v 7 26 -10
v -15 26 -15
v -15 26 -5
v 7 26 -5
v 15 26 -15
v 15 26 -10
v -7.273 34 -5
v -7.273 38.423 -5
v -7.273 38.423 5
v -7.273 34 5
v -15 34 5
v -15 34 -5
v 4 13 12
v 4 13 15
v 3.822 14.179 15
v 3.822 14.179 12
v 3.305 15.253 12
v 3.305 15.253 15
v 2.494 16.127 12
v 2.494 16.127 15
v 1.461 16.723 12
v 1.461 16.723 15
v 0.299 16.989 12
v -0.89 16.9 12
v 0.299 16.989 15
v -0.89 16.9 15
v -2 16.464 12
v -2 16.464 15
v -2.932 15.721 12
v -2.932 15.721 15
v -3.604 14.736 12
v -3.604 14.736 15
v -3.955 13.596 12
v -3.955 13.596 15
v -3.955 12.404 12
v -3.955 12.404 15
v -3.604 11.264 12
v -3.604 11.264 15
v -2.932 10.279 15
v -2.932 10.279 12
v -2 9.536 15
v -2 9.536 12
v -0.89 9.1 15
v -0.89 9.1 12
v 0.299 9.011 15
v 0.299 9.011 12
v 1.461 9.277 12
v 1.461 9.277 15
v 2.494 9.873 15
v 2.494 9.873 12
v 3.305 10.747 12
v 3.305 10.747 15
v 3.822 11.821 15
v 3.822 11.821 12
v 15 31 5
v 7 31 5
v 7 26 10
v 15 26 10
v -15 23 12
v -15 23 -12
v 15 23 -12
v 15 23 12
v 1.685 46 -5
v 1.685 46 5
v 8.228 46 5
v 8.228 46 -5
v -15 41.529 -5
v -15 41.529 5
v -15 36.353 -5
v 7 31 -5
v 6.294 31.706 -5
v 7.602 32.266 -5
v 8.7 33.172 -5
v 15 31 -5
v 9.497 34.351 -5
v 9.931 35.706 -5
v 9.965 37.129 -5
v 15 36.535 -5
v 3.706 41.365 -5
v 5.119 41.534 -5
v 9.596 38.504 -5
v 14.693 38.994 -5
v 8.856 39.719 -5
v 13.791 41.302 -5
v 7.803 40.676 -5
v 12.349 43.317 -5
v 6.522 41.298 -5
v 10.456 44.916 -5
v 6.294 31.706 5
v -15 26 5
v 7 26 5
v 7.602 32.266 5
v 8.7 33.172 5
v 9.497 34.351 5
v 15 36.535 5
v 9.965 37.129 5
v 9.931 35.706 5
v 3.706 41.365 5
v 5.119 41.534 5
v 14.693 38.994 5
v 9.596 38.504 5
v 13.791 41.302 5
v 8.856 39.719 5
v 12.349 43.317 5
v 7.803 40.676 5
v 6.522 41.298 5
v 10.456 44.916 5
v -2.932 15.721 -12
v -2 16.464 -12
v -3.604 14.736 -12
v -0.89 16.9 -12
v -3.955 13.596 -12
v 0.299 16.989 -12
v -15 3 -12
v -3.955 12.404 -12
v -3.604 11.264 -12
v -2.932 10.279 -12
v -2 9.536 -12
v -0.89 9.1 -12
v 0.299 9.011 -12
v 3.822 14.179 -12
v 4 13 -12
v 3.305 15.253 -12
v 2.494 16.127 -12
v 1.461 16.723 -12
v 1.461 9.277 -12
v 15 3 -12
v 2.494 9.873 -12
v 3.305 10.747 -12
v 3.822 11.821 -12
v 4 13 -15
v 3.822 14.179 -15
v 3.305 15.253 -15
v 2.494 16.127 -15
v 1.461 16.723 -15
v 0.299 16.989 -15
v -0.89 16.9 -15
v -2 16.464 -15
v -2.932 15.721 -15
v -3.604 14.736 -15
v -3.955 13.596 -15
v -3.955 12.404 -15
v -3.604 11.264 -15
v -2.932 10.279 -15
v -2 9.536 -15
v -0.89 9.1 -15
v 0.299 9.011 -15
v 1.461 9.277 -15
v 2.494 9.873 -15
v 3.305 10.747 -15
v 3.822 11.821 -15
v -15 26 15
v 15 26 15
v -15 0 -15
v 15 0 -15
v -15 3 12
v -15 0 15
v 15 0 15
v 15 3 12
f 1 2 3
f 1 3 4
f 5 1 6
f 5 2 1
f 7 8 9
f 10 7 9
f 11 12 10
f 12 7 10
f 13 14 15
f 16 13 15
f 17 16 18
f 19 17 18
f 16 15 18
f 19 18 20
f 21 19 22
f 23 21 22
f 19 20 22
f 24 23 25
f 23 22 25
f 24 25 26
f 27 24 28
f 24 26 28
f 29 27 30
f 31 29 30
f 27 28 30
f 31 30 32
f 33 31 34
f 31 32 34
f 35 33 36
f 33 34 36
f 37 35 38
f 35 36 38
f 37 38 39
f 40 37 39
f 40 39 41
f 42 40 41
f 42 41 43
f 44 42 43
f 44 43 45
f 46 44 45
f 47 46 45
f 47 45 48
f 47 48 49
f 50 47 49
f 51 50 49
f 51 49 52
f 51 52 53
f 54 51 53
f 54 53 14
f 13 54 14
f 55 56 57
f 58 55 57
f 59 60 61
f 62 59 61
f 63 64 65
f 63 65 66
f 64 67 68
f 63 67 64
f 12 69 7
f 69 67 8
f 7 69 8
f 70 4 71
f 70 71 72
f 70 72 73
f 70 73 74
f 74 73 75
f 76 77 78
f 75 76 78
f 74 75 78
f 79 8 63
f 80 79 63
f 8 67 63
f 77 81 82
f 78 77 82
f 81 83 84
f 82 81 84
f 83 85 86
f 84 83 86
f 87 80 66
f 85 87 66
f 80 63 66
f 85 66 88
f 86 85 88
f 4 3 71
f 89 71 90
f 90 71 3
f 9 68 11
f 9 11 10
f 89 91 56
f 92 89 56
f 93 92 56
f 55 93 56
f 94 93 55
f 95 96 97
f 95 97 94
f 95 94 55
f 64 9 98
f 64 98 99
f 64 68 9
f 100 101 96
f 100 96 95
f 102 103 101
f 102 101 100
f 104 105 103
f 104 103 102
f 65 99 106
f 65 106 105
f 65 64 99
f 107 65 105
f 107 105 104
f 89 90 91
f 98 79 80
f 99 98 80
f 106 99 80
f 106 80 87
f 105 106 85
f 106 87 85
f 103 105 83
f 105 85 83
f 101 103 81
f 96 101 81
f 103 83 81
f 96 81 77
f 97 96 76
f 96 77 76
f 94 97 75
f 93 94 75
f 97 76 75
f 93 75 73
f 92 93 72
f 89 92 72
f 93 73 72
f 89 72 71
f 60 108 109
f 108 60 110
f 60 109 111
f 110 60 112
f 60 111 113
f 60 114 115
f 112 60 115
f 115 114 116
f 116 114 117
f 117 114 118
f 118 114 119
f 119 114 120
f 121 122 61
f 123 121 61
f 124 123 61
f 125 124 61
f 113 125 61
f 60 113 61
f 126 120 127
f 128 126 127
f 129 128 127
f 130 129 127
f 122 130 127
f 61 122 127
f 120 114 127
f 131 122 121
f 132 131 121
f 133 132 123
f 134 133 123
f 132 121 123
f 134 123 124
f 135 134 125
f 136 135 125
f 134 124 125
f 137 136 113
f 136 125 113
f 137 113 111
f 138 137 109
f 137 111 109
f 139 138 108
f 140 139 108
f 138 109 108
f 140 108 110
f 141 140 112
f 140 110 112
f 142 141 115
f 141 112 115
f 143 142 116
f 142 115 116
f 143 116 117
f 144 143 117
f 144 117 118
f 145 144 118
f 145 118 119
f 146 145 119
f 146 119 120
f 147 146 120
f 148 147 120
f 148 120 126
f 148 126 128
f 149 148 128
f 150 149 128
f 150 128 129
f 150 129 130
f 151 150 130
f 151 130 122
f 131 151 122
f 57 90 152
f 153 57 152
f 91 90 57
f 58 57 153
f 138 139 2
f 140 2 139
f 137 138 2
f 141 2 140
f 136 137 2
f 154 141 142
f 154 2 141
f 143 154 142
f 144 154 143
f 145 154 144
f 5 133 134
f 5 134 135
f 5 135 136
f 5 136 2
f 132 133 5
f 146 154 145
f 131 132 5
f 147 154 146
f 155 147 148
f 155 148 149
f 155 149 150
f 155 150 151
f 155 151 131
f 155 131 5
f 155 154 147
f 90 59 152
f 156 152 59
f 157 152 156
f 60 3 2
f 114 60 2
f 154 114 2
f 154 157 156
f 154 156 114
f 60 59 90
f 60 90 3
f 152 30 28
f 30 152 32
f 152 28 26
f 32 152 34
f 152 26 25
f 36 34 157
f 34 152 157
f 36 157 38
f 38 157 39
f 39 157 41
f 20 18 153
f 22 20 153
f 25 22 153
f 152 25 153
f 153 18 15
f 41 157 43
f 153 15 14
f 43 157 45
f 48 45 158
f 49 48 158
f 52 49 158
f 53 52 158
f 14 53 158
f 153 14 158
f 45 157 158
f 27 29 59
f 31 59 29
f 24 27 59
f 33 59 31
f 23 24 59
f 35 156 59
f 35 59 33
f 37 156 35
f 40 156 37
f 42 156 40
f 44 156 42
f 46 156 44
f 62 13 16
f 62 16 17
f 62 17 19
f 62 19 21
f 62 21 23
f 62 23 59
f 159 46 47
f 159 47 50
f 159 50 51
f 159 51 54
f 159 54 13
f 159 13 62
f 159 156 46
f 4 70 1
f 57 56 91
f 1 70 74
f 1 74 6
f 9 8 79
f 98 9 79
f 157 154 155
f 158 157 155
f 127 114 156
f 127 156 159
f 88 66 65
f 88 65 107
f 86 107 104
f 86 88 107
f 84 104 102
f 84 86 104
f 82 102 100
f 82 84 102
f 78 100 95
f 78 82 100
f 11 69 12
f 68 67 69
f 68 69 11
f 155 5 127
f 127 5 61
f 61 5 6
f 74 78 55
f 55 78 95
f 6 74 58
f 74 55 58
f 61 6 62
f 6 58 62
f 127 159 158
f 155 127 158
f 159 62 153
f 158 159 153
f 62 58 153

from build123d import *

# Parameters (mm, degrees)
SKETCH1_W           = 30
SKETCH1_H           = 30
BOSS_EXTRUDE1_DEPTH = 26
SHELL1_T            = -3
SKETCH3_R           = 4
CUT_EXTRUDE1_DEPTH  = 43.438190348
BOSS_EXTRUDE4_START = -15
SKETCH4_W           = 10
SKETCH4_H           = 20
BOSS_EXTRUDE4_DEPTH = 30
CUT_EXTRUDE2_DEPTH  = 10
RIB1_REACH          = 58.93
SKETCH7_WALL_W      = 122.930630432
SKETCH7_WALL_H      = 8
CUT_EXTRUDE3_DEPTH  = 10
CUT_EXTRUDE4_DEPTH  = 10
BOSS_EXTRUDE5_REACH = 51.434
SKETCH11_W          = 8
SKETCH11_H          = 10


with BuildPart() as part:
    # Sketch1 → Boss-Extrude1 (new body)
    with BuildSketch(Plane(origin=(0, 0, 0), x_dir=(1, 0, 0), z_dir=(0, 1, 0))):
        Rectangle(SKETCH1_W, SKETCH1_H)
    extrude(amount=BOSS_EXTRUDE1_DEPTH)

    # Shell1
    shell1_openings = [part.faces().sort_by_distance(p)[0] for p in [
        (-15, 13, 0),
        (15, 13, 0),
    ]]
    offset(amount=SHELL1_T, openings=shell1_openings, kind=Kind.INTERSECTION)

    # Sketch3 → Cut-Extrude1 (cut, through all)
    with BuildSketch(Plane.XY.offset(15)):
        with Locations((0, 13)):
            Circle(SKETCH3_R)
    extrude(amount=-CUT_EXTRUDE1_DEPTH, mode=Mode.SUBTRACT)

    # Sketch4 → Boss-Extrude4 (add)
    with BuildSketch(Plane(origin=(0, 0, 0), x_dir=(0, 0, -1), z_dir=(1, 0, 0)).offset(BOSS_EXTRUDE4_START)):
        with Locations((0, 36)):
            Rectangle(SKETCH4_W, SKETCH4_H)
    extrude(amount=BOSS_EXTRUDE4_DEPTH)

    # Sketch6 → Cut-Extrude2 (cut)
    with BuildSketch(Plane(origin=(0, 0, -5), x_dir=(-1, 0, 0), z_dir=(0, 0, -1))):
        with BuildLine():
            Line((15, 26), (15, 36.352761804))
            Line((15, 36.352761804), (-3.705905484, 41.364994072))
            ThreePointArc((-3.705905484, 41.364994072), (-9.829629226, 37.829459621), (-6.294095226, 31.705735619))
            Line((-6.294095226, 31.705735619), (15, 26))
        make_face()
    extrude(amount=-CUT_EXTRUDE2_DEPTH, mode=Mode.SUBTRACT)

    # Sketch7 wall → Rib1 (add, up to next)
    with BuildSketch(Plane(origin=(15, 28.5, -7.5), x_dir=(0, -0.707106781187, -0.707106781187), z_dir=(0, 0.707106781187, -0.707106781187)), mode=Mode.PRIVATE) as rib1_sk1:
        with Locations((0, 4)):
            Rectangle(SKETCH7_WALL_W, SKETCH7_WALL_H)
    rib1_tool1 = extrude(rib1_sk1.sketch, amount=-RIB1_REACH, mode=Mode.PRIVATE) - part.part
    rib1 = rib1_tool1.solids().sort_by_distance((15, 28.5, -7.5))[0]
    add(rib1)

    # Mirror1: Rib1 across plane
    add(rib1.mirror(Plane.XY))

    # Sketch8 → Cut-Extrude3 (cut)
    with BuildSketch(Plane(origin=(0, 0, -5), x_dir=(-1, 0, 0), z_dir=(0, 0, -1))):
        Polygon((15, 41.529142706), (-1.685466574, 46), (15, 46), align=None)
    extrude(amount=-CUT_EXTRUDE3_DEPTH, mode=Mode.SUBTRACT)

    # Sketch9 → Cut-Extrude4 (cut)
    with BuildSketch(Plane(origin=(0, 0, -5), x_dir=(-1, 0, 0), z_dir=(0, 0, -1))):
        with BuildLine():
            Line((-15, 36.535364751), (-15, 46))
            Line((-15, 46), (-8.228107743, 46))
            ThreePointArc((-8.228107743, 46), (-13.132683365, 42.354253071), (-15, 36.535364751))
        make_face()
    extrude(amount=-CUT_EXTRUDE4_DEPTH, mode=Mode.SUBTRACT)

    # Boss-Extrude5: up to this plane
    boss_extrude5_end = Plane(origin=(0, 34, 0), z_dir=(0, 1, 0))
    # Sketch11 → Boss-Extrude5 (add, up to the surface)
    with BuildSketch(Plane(origin=(-10.092999923, 37.667588512, 0), x_dir=(0.965925826289068, 0.25881904510252185, 0), z_dir=(0.25881904510252185, -0.965925826289068, 0)), mode=Mode.PRIVATE) as boss_extrude5_sk1:
        with Locations((-1.080100297, 0)):
            Rectangle(SKETCH11_W, SKETCH11_H)
    boss_extrude5_tool1 = split(extrude(boss_extrude5_sk1.sketch, amount=BOSS_EXTRUDE5_REACH, dir=(0, -1, 0), mode=Mode.PRIVATE), bisect_by=boss_extrude5_end, keep=Keep.BOTH, mode=Mode.PRIVATE)
    add(boss_extrude5_tool1.solids().sort_by_distance((-11.136297, 37.388038, 0))[0])


solid = part.part
